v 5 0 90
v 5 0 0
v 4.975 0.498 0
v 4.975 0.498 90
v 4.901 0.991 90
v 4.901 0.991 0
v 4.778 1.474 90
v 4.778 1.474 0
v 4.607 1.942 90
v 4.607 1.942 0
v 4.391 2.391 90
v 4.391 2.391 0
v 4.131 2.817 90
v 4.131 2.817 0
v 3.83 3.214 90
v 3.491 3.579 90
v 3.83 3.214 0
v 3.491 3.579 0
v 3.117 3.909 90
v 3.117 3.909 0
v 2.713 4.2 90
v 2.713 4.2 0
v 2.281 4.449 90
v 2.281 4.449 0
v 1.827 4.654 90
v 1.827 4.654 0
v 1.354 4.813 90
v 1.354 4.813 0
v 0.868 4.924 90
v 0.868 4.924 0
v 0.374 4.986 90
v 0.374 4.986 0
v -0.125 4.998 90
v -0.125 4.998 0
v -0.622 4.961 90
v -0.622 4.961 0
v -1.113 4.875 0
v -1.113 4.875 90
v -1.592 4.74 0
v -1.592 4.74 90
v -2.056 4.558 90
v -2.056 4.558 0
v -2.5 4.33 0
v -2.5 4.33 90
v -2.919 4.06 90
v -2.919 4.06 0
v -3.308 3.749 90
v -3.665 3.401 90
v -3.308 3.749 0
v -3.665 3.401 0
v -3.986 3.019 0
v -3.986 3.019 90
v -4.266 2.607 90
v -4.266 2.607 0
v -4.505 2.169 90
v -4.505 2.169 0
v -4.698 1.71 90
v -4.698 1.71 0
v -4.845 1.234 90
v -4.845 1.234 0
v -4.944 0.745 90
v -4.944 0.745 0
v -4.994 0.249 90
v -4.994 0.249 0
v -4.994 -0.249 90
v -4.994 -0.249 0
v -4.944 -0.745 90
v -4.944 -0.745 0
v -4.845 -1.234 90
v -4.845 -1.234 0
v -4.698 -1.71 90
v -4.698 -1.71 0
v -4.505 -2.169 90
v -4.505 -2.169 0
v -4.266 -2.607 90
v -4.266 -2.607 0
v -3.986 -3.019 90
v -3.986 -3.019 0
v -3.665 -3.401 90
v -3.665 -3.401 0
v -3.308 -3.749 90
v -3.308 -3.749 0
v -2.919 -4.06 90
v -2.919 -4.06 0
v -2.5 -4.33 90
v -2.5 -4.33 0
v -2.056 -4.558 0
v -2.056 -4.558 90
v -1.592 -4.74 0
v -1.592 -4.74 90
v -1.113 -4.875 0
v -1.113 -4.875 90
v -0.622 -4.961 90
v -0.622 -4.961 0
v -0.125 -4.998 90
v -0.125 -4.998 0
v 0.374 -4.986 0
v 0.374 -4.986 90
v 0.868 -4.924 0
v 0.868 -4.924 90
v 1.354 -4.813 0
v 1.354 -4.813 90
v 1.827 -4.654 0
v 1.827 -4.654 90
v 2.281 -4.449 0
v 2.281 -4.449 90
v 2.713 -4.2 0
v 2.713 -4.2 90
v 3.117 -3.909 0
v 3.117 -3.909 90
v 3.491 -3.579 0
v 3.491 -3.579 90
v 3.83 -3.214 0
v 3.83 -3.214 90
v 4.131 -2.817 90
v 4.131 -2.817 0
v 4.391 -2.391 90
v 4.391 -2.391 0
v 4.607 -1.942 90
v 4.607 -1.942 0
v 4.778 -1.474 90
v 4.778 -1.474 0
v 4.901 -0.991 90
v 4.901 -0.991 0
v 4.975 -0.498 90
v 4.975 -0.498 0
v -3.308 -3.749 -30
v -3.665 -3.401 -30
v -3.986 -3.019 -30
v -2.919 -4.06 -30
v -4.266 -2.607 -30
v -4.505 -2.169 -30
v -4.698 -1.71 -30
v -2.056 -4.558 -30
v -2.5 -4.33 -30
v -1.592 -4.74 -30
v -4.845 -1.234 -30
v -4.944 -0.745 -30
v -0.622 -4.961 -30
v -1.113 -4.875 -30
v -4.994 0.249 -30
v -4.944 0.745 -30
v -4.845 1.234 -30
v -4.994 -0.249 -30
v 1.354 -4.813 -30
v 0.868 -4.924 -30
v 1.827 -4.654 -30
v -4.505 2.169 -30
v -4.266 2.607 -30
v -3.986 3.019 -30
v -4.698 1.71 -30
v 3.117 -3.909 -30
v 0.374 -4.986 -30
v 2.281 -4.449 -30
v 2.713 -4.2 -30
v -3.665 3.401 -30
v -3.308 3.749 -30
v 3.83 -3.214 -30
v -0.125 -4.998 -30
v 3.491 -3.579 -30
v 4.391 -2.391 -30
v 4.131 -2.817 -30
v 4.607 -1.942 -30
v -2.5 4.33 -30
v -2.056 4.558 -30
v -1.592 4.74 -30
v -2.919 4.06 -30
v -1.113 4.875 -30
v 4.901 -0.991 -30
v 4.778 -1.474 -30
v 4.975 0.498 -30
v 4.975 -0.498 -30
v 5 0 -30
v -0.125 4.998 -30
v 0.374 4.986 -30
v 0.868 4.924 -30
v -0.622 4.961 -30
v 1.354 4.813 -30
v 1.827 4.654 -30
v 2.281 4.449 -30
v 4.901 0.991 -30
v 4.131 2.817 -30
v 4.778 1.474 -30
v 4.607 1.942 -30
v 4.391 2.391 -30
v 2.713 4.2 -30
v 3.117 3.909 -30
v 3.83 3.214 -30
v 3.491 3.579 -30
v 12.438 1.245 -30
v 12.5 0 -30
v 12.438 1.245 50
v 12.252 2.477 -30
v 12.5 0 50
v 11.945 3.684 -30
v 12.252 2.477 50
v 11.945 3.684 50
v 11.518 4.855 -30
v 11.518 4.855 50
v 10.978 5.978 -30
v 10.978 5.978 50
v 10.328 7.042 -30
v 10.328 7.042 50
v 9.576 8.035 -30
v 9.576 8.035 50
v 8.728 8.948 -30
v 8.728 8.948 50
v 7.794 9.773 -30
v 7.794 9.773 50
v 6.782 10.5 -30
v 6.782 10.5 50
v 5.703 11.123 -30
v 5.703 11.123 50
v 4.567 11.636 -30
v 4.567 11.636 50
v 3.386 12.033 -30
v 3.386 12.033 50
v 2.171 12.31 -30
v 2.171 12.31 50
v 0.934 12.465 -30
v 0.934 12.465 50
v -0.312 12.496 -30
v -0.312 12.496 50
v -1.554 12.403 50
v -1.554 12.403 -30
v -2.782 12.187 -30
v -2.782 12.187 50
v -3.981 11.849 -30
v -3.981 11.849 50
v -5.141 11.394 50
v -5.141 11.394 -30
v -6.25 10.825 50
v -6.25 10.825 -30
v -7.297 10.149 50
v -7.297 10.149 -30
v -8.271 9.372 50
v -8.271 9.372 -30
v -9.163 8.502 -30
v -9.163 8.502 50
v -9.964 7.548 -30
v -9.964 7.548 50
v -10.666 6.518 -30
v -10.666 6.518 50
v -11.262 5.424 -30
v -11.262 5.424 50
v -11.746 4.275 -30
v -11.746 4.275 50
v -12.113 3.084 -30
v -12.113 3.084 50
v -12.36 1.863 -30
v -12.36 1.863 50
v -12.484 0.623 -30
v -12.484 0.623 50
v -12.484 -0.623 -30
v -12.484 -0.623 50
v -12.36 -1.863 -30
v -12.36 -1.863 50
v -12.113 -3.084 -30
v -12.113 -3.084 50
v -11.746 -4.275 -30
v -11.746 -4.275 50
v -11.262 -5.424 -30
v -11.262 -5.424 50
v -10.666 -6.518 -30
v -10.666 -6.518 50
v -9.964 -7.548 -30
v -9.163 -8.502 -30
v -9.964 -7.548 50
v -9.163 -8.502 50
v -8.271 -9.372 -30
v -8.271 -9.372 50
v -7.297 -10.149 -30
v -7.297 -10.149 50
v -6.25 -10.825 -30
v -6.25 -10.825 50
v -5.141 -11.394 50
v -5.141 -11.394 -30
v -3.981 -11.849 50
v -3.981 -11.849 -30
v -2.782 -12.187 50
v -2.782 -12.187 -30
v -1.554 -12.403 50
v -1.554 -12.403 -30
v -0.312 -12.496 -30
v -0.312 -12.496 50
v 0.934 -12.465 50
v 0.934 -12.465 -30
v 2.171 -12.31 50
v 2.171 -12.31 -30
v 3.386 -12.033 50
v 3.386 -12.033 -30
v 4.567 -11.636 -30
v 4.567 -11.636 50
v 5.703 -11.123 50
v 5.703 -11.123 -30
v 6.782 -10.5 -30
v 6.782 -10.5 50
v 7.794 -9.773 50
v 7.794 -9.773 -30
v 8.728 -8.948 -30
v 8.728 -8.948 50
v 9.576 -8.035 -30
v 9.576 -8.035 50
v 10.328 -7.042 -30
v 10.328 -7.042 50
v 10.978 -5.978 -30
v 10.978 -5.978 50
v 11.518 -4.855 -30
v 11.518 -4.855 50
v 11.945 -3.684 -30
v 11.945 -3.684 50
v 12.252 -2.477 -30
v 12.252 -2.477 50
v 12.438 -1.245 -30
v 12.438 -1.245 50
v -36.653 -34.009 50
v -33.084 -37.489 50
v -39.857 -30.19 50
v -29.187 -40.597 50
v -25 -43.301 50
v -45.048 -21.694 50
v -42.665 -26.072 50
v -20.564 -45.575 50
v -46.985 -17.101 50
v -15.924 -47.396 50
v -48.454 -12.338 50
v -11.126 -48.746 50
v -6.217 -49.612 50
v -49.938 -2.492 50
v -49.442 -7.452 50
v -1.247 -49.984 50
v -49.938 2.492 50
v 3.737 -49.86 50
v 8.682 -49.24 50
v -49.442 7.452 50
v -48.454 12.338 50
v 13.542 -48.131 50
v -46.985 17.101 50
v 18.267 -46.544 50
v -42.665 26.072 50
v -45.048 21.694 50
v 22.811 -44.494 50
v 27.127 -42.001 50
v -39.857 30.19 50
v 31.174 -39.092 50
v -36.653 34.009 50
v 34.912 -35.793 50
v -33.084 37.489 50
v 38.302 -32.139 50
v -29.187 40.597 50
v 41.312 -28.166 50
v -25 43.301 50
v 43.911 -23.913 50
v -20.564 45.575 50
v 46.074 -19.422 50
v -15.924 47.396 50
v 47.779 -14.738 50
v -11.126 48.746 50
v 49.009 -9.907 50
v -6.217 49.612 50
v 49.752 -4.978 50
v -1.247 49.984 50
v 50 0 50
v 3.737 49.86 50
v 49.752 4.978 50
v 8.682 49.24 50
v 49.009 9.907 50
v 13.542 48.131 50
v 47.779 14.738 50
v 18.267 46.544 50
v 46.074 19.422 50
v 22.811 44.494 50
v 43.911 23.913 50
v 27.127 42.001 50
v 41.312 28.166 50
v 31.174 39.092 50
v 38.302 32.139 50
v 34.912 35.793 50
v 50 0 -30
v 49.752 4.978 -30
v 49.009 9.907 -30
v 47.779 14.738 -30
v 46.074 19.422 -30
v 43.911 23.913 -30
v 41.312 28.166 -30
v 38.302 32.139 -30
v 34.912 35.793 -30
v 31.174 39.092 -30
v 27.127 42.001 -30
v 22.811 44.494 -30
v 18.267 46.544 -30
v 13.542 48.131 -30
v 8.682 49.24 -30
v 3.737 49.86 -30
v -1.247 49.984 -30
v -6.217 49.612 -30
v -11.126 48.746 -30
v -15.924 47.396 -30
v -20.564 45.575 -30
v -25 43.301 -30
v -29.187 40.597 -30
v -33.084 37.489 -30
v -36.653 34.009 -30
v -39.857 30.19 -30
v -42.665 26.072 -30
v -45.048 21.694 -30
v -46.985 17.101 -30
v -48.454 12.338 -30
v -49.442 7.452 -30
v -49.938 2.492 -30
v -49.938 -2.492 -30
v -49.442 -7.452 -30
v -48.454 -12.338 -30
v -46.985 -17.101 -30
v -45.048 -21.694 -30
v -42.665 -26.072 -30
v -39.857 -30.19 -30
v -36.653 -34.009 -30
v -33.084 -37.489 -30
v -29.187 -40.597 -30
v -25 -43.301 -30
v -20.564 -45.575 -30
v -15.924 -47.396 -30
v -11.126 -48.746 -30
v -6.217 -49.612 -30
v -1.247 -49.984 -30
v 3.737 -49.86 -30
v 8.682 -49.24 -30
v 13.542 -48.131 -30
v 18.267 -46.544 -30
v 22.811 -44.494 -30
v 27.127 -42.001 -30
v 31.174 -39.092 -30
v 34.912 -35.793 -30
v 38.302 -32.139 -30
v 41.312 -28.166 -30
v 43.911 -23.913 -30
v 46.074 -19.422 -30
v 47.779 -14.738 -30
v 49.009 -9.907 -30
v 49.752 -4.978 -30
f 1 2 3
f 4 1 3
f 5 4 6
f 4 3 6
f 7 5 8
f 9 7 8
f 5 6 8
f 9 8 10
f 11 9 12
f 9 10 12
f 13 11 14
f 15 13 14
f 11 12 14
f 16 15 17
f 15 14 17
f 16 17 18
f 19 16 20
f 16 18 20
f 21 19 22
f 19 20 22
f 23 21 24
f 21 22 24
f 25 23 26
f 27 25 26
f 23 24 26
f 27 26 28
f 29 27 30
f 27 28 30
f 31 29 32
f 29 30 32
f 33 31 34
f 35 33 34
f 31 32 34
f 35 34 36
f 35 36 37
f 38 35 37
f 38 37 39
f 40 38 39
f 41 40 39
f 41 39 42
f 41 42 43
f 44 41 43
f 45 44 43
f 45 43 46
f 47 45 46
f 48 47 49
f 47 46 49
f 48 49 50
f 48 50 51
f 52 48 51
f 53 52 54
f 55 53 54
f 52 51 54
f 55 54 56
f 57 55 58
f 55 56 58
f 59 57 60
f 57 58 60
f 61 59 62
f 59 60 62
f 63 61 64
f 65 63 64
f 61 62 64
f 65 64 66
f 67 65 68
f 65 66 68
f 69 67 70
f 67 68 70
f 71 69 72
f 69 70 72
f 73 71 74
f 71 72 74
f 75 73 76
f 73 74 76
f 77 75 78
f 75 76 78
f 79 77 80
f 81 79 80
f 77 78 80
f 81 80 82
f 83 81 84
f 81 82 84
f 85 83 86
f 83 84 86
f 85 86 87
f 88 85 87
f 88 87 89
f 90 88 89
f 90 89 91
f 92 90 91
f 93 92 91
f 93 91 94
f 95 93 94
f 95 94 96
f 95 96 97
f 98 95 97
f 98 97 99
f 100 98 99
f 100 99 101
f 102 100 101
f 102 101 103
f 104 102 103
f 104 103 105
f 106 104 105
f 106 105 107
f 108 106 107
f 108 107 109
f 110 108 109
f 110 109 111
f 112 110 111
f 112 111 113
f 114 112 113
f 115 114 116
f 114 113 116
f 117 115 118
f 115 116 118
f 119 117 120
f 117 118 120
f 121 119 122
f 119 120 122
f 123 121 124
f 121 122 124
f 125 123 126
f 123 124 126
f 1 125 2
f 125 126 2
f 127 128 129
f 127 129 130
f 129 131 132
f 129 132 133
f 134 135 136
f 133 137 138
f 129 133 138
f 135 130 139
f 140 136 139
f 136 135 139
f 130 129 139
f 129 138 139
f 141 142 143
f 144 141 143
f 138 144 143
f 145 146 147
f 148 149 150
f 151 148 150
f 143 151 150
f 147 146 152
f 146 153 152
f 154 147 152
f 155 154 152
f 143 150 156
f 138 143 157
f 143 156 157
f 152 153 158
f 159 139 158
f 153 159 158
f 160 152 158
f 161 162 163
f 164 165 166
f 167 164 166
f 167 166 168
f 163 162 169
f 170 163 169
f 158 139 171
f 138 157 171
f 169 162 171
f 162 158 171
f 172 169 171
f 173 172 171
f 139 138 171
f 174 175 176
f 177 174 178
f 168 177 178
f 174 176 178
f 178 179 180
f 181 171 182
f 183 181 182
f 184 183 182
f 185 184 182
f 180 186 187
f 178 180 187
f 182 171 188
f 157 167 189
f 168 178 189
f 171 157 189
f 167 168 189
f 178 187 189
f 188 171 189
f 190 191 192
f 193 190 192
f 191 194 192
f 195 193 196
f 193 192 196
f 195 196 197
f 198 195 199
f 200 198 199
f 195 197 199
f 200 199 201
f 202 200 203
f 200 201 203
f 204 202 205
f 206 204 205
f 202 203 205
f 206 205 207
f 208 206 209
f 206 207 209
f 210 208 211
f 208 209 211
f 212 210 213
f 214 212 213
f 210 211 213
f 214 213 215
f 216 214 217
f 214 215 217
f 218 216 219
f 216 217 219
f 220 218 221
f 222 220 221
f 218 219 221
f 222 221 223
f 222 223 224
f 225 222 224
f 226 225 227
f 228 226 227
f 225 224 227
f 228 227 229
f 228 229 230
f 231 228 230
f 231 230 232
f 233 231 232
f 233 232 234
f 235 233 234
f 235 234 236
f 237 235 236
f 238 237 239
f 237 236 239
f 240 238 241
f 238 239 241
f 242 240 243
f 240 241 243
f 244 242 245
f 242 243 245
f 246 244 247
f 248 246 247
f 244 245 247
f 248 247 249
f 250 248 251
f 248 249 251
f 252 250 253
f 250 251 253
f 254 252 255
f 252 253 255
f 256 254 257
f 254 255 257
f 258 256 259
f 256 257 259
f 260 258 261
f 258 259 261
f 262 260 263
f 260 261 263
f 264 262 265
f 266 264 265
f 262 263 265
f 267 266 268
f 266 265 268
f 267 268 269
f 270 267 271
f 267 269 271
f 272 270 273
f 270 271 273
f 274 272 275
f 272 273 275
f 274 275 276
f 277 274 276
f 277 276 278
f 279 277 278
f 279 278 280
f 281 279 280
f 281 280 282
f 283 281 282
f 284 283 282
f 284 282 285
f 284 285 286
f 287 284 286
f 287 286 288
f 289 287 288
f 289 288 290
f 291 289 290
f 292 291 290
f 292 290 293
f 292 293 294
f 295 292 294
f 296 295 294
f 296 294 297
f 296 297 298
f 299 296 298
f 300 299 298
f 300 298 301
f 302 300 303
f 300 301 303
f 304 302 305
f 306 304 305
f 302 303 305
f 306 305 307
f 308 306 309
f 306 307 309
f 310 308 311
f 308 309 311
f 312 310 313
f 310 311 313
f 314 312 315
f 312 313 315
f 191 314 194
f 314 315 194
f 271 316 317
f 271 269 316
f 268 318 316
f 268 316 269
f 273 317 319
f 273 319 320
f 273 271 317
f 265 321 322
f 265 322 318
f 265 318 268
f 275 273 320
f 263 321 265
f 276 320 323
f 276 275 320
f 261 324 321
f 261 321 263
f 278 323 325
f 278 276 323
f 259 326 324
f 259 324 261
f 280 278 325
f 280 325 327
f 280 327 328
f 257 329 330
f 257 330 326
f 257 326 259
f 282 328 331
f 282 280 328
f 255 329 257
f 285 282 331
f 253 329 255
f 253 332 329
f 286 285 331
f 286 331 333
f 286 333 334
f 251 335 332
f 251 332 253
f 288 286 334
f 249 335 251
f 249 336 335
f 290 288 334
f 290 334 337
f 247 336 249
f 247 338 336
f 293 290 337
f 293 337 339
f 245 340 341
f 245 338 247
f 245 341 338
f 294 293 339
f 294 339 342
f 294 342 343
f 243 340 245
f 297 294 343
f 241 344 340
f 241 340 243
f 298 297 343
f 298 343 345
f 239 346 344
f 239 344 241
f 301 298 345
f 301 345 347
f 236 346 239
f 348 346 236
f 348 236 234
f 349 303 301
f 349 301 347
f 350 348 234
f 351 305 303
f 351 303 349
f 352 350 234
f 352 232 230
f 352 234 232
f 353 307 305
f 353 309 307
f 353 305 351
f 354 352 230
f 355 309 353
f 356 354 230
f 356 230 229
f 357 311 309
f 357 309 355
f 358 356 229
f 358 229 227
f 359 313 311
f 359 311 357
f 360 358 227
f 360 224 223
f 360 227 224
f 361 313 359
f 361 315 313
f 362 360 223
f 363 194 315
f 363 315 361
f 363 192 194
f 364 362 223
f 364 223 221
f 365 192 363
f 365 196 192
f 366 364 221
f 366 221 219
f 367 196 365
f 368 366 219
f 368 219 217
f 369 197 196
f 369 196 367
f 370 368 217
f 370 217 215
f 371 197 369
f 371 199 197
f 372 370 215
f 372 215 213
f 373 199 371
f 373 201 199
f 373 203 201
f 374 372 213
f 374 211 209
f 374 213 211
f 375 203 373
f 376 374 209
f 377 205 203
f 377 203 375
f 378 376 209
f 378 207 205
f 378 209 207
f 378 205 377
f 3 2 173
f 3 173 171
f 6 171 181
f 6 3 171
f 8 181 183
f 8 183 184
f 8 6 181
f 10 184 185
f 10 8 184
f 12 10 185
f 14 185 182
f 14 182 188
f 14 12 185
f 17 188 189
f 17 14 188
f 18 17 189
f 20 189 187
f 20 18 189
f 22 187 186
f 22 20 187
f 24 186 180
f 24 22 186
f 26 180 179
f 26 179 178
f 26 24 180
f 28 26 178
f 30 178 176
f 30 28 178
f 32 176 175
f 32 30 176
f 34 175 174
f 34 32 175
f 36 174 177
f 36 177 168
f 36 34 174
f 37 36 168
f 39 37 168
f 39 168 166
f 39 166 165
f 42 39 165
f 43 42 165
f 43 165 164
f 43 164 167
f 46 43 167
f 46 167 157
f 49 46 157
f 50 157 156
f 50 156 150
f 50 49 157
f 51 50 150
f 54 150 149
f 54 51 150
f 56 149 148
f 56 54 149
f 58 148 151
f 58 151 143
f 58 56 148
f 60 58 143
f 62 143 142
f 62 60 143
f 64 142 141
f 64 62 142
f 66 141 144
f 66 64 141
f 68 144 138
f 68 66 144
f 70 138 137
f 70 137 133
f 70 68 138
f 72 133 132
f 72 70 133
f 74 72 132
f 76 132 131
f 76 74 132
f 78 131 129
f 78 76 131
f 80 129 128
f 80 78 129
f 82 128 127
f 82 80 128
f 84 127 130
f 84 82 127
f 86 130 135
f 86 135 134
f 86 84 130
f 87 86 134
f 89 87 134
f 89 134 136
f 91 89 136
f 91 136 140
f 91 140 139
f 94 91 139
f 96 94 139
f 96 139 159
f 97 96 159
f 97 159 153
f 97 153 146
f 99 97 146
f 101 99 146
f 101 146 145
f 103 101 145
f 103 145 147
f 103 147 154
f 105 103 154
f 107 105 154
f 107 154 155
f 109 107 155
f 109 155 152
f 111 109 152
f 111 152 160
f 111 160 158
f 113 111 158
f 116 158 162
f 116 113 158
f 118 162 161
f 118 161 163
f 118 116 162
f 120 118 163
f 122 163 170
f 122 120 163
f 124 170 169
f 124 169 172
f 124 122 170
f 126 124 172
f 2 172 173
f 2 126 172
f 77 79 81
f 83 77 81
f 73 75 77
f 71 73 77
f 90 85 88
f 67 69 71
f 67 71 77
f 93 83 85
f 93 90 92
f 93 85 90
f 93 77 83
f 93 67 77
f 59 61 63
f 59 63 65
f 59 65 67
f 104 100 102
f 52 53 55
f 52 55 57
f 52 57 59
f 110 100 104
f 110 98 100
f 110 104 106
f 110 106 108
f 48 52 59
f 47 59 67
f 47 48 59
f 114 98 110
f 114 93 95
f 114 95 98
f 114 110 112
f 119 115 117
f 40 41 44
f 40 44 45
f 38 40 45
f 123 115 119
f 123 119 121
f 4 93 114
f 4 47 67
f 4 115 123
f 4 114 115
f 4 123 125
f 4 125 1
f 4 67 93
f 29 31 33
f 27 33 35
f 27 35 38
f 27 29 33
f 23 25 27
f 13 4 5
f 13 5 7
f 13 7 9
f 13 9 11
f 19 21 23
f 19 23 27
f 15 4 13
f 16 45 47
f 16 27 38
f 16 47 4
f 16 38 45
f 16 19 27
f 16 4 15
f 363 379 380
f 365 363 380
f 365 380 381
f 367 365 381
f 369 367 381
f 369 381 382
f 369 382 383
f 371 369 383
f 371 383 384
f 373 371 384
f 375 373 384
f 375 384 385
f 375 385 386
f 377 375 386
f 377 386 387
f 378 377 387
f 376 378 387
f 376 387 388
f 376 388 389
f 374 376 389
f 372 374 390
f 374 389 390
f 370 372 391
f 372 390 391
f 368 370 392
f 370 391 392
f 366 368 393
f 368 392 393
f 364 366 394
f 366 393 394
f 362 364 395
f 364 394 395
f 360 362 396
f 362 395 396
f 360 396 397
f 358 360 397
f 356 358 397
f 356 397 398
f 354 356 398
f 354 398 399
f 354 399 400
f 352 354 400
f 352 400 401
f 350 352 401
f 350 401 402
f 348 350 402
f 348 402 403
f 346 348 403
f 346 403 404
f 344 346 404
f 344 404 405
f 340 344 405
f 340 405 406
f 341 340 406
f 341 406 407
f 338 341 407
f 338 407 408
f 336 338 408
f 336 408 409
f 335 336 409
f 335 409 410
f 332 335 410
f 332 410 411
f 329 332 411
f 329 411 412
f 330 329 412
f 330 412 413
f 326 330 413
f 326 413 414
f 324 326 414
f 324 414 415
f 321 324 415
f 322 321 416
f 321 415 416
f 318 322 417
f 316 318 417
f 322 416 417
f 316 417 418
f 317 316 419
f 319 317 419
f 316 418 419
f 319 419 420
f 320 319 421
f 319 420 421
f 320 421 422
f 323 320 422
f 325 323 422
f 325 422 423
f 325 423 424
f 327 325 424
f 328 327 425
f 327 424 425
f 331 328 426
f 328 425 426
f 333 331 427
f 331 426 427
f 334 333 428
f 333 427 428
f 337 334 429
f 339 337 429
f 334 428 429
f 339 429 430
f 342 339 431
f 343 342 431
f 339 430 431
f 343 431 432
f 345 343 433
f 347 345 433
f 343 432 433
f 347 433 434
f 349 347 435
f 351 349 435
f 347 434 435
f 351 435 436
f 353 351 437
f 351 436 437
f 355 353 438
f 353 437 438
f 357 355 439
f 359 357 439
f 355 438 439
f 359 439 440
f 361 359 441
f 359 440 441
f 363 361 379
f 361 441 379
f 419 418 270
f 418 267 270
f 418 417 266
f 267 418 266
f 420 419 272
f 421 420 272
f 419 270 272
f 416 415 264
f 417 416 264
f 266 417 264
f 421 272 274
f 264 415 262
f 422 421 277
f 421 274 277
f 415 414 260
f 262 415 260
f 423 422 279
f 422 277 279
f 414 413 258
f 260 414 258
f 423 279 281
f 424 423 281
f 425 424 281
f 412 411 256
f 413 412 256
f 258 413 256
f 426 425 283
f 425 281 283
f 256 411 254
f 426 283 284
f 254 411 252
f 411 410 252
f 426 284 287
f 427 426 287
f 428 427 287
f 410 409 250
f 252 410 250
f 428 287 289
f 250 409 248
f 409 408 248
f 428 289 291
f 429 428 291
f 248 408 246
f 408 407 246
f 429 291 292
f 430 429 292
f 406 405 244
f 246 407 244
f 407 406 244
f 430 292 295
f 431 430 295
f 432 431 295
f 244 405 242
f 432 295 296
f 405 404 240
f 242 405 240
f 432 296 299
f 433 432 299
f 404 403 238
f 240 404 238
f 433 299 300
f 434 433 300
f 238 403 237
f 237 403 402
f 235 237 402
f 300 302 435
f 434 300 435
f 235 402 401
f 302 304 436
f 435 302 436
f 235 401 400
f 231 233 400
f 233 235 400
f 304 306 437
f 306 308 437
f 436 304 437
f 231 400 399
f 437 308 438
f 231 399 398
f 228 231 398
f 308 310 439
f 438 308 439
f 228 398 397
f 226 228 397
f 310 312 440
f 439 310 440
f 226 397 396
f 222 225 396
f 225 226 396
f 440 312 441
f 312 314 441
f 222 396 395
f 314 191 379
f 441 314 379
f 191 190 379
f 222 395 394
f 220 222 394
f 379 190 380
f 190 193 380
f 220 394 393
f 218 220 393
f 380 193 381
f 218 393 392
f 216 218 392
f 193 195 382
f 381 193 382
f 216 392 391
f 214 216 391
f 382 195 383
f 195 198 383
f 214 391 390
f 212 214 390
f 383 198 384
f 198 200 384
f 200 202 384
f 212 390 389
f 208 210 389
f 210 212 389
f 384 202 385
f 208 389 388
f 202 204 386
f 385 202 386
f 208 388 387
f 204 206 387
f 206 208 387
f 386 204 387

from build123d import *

# Parameters (mm, degrees)
F0_R     = 50
F0_R_2   = 42.5
F0_R_3   = 12.5
F1_DEPTH = 30
F0_R_4   = 5
F2_DEPTH = 90
F3_DEPTH = 50


with BuildPart() as f1:
    # F0 (on Top) → F1 (new body)
    with BuildSketch(Plane.XY):
        Circle(F0_R)
        Circle(F0_R_2, mode=Mode.SUBTRACT)
        Circle(F0_R_2)
        Circle(F0_R_3, mode=Mode.SUBTRACT)
    extrude(amount=-F1_DEPTH)

    # F3 (add): faces of the model
    f3_faces = [f1.faces().sort_by_distance(p)[0] for p in [
        (-48.5857864376, 0, 0),
        (-48.5857864376, 0, -30),
    ]]
    extrude(f3_faces, amount=F3_DEPTH, dir=(0, 0, 1))


with BuildPart() as f1b:
    # F0 (on Top) → F1, piece 2 (new body)
    with BuildSketch(Plane.XY):
        Circle(F0_R_4)
    extrude(amount=-F1_DEPTH)

    # F2 (add): a face of the model
    f2_faces = [f1b.faces().sort_by_distance(p)[0] for p in [
        (0, 0, 0),
    ]]
    extrude(f2_faces, amount=F2_DEPTH)


solid = Compound([f1.part, f1b.part])
